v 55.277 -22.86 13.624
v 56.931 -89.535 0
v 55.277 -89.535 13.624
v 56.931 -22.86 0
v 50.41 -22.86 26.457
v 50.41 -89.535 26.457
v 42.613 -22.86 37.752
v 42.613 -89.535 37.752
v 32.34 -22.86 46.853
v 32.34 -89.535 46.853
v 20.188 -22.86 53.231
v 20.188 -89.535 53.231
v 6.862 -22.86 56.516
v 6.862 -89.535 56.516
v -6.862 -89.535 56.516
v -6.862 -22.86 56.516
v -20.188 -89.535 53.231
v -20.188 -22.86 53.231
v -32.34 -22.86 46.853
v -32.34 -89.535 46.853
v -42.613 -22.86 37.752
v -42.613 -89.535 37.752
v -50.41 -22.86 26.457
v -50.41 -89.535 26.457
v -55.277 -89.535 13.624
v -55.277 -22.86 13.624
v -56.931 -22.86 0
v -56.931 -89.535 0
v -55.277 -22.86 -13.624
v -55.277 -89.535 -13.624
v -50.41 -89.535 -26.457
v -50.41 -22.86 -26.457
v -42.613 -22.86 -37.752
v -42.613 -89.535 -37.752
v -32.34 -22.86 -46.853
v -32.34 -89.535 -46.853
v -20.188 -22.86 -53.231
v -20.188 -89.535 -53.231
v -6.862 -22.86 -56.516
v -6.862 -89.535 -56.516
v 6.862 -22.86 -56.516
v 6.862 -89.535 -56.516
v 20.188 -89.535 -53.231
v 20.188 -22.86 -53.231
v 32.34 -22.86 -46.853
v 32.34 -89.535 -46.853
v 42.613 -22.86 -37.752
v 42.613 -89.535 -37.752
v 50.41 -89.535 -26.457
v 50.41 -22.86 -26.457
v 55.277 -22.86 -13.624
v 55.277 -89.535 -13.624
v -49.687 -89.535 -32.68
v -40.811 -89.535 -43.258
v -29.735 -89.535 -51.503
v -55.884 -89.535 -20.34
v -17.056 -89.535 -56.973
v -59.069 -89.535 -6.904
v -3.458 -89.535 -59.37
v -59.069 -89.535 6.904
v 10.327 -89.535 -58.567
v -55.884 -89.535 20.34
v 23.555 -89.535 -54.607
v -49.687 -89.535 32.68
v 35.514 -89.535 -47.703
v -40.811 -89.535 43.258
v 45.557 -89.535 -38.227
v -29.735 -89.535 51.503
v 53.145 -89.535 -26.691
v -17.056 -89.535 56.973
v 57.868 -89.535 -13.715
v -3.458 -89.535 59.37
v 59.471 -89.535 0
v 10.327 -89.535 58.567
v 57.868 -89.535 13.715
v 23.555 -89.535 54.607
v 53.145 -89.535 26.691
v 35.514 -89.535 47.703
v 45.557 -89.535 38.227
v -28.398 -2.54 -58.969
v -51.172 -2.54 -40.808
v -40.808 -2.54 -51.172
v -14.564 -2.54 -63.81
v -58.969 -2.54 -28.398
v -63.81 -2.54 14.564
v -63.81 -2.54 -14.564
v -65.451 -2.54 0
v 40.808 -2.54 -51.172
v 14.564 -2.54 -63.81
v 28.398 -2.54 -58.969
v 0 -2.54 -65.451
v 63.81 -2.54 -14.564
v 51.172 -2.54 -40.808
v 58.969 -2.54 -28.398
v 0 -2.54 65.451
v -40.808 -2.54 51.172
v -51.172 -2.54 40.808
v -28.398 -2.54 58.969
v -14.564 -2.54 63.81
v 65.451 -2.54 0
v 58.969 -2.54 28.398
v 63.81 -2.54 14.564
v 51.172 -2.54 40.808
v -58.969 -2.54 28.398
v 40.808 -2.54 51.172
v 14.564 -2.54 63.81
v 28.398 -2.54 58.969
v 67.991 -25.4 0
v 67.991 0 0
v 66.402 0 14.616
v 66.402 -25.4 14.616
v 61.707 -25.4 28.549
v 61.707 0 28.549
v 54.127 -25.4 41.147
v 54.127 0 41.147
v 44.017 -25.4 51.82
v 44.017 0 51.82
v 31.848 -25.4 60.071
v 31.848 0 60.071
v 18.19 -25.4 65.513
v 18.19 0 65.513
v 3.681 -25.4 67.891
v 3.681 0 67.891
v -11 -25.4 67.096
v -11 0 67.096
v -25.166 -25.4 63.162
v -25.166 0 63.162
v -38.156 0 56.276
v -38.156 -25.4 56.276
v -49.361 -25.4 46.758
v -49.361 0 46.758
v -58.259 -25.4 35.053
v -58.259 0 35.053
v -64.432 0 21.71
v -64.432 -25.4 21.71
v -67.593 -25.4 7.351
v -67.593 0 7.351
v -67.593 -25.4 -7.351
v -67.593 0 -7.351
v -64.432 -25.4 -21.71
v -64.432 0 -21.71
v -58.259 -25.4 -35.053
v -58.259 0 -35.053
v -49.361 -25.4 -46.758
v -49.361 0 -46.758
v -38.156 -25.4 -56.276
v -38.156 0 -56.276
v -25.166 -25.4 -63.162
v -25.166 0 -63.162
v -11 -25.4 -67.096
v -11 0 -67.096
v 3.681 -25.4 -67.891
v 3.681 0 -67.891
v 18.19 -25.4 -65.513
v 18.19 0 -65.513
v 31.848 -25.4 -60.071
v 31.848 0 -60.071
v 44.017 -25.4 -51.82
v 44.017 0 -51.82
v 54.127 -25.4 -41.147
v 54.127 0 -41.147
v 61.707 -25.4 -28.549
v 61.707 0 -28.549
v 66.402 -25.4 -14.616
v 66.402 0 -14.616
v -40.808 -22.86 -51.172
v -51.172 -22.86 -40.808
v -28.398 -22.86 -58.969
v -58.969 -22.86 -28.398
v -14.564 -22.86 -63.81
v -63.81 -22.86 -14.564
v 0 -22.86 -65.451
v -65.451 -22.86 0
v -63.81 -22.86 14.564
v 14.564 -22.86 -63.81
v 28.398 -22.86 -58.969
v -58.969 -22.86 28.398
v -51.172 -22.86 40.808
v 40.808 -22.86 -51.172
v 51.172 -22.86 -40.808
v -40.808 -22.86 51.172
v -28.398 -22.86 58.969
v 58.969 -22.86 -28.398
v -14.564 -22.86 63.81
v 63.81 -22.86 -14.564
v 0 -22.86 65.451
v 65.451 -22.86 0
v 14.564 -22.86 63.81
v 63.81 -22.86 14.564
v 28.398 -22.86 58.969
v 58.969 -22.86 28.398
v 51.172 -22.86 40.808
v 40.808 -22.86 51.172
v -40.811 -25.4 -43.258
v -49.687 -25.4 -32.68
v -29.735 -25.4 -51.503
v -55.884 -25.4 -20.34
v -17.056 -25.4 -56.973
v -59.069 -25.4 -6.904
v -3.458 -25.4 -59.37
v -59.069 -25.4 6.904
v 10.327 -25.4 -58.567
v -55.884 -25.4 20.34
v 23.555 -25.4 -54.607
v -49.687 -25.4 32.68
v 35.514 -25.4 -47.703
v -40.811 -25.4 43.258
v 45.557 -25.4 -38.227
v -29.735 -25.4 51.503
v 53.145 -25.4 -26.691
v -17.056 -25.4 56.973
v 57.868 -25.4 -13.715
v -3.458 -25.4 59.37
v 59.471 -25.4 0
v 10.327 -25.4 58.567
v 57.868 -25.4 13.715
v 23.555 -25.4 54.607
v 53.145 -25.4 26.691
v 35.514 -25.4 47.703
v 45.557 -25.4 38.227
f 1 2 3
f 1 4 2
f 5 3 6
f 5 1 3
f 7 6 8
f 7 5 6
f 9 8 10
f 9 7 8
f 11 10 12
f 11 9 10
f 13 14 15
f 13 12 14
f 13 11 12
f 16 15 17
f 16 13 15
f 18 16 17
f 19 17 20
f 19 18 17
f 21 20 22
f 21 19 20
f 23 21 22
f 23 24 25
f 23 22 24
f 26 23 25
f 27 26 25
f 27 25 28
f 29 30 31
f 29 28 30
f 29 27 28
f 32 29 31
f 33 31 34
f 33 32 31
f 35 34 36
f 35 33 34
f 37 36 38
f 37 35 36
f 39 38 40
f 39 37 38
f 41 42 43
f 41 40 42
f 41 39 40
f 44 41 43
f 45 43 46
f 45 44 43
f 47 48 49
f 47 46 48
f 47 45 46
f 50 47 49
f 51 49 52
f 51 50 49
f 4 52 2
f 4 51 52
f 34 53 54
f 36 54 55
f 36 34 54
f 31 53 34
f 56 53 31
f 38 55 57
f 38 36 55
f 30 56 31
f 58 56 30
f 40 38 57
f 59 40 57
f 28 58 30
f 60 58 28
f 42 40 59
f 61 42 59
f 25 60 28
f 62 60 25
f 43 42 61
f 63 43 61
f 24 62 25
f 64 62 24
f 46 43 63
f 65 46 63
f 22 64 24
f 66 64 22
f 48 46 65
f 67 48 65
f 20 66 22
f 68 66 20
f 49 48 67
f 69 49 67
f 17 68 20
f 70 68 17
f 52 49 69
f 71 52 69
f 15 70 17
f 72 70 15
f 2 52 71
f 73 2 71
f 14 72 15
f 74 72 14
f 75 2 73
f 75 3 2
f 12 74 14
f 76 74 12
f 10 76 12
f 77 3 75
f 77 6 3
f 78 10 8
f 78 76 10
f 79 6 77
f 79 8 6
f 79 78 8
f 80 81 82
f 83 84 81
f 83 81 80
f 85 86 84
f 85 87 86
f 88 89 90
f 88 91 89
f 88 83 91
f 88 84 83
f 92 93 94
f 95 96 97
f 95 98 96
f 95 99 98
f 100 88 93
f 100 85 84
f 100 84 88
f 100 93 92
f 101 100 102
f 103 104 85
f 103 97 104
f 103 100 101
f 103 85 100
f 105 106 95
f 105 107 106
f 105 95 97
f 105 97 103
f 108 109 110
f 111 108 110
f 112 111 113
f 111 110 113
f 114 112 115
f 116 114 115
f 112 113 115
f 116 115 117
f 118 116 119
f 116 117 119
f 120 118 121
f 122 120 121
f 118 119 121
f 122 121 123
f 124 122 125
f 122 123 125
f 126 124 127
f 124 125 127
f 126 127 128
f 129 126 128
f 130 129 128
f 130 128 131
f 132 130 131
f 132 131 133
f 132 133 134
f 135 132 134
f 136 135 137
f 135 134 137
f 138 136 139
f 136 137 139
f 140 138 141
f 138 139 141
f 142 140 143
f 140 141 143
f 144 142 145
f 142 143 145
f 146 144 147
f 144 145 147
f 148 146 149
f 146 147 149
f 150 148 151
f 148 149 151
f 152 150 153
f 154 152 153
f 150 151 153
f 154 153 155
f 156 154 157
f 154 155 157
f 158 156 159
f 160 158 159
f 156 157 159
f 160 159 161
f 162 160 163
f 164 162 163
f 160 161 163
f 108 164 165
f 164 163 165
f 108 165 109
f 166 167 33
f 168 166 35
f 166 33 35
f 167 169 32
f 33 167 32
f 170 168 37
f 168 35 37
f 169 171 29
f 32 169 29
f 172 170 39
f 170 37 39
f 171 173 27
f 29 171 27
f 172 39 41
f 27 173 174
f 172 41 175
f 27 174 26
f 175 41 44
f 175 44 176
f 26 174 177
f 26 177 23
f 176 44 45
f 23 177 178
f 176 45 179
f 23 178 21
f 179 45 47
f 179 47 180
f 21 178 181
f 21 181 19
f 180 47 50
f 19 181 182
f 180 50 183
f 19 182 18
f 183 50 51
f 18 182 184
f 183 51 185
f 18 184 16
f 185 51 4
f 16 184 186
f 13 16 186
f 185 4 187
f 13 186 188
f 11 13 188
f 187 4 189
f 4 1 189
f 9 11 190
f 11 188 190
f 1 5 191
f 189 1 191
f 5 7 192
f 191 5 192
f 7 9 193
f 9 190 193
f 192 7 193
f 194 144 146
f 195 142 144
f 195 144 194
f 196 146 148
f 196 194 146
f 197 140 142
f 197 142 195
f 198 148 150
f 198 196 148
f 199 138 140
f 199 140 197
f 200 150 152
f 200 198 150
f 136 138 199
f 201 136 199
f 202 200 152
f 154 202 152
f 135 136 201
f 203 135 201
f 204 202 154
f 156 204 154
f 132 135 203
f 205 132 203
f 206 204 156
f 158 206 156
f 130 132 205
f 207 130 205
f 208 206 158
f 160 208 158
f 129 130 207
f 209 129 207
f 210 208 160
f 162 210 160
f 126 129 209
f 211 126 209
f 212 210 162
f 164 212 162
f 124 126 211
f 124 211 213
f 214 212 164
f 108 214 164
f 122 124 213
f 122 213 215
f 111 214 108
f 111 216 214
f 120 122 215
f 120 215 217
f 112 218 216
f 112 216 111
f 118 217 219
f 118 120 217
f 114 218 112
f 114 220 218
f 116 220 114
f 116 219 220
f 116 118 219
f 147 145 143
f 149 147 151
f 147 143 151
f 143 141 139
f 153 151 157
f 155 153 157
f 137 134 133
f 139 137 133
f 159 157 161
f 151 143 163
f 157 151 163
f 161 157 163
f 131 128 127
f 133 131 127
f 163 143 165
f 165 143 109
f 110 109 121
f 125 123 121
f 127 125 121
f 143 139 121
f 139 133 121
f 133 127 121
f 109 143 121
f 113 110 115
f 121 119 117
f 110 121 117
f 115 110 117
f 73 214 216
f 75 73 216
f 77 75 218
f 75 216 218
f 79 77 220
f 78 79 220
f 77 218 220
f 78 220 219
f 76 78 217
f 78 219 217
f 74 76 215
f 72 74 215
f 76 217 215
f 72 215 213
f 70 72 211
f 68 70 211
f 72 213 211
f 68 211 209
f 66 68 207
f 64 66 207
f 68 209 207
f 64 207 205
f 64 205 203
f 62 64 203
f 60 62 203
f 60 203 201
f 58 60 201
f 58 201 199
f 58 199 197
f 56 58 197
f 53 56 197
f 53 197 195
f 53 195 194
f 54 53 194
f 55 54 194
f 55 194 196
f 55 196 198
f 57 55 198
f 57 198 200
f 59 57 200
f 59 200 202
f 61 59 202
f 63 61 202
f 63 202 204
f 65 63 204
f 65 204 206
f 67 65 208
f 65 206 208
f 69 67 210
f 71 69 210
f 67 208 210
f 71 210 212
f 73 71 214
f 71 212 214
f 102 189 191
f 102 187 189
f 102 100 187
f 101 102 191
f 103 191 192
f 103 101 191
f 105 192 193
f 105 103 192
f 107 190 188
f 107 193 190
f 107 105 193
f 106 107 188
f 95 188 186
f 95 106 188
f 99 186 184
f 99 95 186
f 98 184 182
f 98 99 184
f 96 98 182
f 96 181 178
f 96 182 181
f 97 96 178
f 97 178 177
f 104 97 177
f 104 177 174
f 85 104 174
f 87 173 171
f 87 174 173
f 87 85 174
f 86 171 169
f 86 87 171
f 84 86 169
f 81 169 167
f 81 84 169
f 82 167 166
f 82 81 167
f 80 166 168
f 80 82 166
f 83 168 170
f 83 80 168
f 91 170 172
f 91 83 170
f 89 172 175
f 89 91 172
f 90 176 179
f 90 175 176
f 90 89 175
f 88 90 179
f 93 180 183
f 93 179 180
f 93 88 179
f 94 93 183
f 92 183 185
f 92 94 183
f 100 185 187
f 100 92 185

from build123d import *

# Parameters (mm, degrees)
F0_R     = 67.9912041861
F1_DEPTH = 25.4
F2_R     = 59.4709809198
F3_DEPTH = 89.535
F4_T     = -2.54


with BuildPart() as f1:
    # F0 (on Front) → F1 (new body)
    with BuildSketch(Plane.XZ):
        Circle(F0_R)
    extrude(amount=F1_DEPTH)

    # F2 (on Front) → F3 (join)
    with BuildSketch(Plane.XZ):
        Circle(F2_R)
    extrude(amount=F3_DEPTH)

    # F4
    f4_openings = [f1.faces().sort_by_distance(p)[0] for p in [
        (0, -89.535, 0),
    ]]
    offset(amount=F4_T, openings=f4_openings, kind=Kind.INTERSECTION)


solid = f1.part
